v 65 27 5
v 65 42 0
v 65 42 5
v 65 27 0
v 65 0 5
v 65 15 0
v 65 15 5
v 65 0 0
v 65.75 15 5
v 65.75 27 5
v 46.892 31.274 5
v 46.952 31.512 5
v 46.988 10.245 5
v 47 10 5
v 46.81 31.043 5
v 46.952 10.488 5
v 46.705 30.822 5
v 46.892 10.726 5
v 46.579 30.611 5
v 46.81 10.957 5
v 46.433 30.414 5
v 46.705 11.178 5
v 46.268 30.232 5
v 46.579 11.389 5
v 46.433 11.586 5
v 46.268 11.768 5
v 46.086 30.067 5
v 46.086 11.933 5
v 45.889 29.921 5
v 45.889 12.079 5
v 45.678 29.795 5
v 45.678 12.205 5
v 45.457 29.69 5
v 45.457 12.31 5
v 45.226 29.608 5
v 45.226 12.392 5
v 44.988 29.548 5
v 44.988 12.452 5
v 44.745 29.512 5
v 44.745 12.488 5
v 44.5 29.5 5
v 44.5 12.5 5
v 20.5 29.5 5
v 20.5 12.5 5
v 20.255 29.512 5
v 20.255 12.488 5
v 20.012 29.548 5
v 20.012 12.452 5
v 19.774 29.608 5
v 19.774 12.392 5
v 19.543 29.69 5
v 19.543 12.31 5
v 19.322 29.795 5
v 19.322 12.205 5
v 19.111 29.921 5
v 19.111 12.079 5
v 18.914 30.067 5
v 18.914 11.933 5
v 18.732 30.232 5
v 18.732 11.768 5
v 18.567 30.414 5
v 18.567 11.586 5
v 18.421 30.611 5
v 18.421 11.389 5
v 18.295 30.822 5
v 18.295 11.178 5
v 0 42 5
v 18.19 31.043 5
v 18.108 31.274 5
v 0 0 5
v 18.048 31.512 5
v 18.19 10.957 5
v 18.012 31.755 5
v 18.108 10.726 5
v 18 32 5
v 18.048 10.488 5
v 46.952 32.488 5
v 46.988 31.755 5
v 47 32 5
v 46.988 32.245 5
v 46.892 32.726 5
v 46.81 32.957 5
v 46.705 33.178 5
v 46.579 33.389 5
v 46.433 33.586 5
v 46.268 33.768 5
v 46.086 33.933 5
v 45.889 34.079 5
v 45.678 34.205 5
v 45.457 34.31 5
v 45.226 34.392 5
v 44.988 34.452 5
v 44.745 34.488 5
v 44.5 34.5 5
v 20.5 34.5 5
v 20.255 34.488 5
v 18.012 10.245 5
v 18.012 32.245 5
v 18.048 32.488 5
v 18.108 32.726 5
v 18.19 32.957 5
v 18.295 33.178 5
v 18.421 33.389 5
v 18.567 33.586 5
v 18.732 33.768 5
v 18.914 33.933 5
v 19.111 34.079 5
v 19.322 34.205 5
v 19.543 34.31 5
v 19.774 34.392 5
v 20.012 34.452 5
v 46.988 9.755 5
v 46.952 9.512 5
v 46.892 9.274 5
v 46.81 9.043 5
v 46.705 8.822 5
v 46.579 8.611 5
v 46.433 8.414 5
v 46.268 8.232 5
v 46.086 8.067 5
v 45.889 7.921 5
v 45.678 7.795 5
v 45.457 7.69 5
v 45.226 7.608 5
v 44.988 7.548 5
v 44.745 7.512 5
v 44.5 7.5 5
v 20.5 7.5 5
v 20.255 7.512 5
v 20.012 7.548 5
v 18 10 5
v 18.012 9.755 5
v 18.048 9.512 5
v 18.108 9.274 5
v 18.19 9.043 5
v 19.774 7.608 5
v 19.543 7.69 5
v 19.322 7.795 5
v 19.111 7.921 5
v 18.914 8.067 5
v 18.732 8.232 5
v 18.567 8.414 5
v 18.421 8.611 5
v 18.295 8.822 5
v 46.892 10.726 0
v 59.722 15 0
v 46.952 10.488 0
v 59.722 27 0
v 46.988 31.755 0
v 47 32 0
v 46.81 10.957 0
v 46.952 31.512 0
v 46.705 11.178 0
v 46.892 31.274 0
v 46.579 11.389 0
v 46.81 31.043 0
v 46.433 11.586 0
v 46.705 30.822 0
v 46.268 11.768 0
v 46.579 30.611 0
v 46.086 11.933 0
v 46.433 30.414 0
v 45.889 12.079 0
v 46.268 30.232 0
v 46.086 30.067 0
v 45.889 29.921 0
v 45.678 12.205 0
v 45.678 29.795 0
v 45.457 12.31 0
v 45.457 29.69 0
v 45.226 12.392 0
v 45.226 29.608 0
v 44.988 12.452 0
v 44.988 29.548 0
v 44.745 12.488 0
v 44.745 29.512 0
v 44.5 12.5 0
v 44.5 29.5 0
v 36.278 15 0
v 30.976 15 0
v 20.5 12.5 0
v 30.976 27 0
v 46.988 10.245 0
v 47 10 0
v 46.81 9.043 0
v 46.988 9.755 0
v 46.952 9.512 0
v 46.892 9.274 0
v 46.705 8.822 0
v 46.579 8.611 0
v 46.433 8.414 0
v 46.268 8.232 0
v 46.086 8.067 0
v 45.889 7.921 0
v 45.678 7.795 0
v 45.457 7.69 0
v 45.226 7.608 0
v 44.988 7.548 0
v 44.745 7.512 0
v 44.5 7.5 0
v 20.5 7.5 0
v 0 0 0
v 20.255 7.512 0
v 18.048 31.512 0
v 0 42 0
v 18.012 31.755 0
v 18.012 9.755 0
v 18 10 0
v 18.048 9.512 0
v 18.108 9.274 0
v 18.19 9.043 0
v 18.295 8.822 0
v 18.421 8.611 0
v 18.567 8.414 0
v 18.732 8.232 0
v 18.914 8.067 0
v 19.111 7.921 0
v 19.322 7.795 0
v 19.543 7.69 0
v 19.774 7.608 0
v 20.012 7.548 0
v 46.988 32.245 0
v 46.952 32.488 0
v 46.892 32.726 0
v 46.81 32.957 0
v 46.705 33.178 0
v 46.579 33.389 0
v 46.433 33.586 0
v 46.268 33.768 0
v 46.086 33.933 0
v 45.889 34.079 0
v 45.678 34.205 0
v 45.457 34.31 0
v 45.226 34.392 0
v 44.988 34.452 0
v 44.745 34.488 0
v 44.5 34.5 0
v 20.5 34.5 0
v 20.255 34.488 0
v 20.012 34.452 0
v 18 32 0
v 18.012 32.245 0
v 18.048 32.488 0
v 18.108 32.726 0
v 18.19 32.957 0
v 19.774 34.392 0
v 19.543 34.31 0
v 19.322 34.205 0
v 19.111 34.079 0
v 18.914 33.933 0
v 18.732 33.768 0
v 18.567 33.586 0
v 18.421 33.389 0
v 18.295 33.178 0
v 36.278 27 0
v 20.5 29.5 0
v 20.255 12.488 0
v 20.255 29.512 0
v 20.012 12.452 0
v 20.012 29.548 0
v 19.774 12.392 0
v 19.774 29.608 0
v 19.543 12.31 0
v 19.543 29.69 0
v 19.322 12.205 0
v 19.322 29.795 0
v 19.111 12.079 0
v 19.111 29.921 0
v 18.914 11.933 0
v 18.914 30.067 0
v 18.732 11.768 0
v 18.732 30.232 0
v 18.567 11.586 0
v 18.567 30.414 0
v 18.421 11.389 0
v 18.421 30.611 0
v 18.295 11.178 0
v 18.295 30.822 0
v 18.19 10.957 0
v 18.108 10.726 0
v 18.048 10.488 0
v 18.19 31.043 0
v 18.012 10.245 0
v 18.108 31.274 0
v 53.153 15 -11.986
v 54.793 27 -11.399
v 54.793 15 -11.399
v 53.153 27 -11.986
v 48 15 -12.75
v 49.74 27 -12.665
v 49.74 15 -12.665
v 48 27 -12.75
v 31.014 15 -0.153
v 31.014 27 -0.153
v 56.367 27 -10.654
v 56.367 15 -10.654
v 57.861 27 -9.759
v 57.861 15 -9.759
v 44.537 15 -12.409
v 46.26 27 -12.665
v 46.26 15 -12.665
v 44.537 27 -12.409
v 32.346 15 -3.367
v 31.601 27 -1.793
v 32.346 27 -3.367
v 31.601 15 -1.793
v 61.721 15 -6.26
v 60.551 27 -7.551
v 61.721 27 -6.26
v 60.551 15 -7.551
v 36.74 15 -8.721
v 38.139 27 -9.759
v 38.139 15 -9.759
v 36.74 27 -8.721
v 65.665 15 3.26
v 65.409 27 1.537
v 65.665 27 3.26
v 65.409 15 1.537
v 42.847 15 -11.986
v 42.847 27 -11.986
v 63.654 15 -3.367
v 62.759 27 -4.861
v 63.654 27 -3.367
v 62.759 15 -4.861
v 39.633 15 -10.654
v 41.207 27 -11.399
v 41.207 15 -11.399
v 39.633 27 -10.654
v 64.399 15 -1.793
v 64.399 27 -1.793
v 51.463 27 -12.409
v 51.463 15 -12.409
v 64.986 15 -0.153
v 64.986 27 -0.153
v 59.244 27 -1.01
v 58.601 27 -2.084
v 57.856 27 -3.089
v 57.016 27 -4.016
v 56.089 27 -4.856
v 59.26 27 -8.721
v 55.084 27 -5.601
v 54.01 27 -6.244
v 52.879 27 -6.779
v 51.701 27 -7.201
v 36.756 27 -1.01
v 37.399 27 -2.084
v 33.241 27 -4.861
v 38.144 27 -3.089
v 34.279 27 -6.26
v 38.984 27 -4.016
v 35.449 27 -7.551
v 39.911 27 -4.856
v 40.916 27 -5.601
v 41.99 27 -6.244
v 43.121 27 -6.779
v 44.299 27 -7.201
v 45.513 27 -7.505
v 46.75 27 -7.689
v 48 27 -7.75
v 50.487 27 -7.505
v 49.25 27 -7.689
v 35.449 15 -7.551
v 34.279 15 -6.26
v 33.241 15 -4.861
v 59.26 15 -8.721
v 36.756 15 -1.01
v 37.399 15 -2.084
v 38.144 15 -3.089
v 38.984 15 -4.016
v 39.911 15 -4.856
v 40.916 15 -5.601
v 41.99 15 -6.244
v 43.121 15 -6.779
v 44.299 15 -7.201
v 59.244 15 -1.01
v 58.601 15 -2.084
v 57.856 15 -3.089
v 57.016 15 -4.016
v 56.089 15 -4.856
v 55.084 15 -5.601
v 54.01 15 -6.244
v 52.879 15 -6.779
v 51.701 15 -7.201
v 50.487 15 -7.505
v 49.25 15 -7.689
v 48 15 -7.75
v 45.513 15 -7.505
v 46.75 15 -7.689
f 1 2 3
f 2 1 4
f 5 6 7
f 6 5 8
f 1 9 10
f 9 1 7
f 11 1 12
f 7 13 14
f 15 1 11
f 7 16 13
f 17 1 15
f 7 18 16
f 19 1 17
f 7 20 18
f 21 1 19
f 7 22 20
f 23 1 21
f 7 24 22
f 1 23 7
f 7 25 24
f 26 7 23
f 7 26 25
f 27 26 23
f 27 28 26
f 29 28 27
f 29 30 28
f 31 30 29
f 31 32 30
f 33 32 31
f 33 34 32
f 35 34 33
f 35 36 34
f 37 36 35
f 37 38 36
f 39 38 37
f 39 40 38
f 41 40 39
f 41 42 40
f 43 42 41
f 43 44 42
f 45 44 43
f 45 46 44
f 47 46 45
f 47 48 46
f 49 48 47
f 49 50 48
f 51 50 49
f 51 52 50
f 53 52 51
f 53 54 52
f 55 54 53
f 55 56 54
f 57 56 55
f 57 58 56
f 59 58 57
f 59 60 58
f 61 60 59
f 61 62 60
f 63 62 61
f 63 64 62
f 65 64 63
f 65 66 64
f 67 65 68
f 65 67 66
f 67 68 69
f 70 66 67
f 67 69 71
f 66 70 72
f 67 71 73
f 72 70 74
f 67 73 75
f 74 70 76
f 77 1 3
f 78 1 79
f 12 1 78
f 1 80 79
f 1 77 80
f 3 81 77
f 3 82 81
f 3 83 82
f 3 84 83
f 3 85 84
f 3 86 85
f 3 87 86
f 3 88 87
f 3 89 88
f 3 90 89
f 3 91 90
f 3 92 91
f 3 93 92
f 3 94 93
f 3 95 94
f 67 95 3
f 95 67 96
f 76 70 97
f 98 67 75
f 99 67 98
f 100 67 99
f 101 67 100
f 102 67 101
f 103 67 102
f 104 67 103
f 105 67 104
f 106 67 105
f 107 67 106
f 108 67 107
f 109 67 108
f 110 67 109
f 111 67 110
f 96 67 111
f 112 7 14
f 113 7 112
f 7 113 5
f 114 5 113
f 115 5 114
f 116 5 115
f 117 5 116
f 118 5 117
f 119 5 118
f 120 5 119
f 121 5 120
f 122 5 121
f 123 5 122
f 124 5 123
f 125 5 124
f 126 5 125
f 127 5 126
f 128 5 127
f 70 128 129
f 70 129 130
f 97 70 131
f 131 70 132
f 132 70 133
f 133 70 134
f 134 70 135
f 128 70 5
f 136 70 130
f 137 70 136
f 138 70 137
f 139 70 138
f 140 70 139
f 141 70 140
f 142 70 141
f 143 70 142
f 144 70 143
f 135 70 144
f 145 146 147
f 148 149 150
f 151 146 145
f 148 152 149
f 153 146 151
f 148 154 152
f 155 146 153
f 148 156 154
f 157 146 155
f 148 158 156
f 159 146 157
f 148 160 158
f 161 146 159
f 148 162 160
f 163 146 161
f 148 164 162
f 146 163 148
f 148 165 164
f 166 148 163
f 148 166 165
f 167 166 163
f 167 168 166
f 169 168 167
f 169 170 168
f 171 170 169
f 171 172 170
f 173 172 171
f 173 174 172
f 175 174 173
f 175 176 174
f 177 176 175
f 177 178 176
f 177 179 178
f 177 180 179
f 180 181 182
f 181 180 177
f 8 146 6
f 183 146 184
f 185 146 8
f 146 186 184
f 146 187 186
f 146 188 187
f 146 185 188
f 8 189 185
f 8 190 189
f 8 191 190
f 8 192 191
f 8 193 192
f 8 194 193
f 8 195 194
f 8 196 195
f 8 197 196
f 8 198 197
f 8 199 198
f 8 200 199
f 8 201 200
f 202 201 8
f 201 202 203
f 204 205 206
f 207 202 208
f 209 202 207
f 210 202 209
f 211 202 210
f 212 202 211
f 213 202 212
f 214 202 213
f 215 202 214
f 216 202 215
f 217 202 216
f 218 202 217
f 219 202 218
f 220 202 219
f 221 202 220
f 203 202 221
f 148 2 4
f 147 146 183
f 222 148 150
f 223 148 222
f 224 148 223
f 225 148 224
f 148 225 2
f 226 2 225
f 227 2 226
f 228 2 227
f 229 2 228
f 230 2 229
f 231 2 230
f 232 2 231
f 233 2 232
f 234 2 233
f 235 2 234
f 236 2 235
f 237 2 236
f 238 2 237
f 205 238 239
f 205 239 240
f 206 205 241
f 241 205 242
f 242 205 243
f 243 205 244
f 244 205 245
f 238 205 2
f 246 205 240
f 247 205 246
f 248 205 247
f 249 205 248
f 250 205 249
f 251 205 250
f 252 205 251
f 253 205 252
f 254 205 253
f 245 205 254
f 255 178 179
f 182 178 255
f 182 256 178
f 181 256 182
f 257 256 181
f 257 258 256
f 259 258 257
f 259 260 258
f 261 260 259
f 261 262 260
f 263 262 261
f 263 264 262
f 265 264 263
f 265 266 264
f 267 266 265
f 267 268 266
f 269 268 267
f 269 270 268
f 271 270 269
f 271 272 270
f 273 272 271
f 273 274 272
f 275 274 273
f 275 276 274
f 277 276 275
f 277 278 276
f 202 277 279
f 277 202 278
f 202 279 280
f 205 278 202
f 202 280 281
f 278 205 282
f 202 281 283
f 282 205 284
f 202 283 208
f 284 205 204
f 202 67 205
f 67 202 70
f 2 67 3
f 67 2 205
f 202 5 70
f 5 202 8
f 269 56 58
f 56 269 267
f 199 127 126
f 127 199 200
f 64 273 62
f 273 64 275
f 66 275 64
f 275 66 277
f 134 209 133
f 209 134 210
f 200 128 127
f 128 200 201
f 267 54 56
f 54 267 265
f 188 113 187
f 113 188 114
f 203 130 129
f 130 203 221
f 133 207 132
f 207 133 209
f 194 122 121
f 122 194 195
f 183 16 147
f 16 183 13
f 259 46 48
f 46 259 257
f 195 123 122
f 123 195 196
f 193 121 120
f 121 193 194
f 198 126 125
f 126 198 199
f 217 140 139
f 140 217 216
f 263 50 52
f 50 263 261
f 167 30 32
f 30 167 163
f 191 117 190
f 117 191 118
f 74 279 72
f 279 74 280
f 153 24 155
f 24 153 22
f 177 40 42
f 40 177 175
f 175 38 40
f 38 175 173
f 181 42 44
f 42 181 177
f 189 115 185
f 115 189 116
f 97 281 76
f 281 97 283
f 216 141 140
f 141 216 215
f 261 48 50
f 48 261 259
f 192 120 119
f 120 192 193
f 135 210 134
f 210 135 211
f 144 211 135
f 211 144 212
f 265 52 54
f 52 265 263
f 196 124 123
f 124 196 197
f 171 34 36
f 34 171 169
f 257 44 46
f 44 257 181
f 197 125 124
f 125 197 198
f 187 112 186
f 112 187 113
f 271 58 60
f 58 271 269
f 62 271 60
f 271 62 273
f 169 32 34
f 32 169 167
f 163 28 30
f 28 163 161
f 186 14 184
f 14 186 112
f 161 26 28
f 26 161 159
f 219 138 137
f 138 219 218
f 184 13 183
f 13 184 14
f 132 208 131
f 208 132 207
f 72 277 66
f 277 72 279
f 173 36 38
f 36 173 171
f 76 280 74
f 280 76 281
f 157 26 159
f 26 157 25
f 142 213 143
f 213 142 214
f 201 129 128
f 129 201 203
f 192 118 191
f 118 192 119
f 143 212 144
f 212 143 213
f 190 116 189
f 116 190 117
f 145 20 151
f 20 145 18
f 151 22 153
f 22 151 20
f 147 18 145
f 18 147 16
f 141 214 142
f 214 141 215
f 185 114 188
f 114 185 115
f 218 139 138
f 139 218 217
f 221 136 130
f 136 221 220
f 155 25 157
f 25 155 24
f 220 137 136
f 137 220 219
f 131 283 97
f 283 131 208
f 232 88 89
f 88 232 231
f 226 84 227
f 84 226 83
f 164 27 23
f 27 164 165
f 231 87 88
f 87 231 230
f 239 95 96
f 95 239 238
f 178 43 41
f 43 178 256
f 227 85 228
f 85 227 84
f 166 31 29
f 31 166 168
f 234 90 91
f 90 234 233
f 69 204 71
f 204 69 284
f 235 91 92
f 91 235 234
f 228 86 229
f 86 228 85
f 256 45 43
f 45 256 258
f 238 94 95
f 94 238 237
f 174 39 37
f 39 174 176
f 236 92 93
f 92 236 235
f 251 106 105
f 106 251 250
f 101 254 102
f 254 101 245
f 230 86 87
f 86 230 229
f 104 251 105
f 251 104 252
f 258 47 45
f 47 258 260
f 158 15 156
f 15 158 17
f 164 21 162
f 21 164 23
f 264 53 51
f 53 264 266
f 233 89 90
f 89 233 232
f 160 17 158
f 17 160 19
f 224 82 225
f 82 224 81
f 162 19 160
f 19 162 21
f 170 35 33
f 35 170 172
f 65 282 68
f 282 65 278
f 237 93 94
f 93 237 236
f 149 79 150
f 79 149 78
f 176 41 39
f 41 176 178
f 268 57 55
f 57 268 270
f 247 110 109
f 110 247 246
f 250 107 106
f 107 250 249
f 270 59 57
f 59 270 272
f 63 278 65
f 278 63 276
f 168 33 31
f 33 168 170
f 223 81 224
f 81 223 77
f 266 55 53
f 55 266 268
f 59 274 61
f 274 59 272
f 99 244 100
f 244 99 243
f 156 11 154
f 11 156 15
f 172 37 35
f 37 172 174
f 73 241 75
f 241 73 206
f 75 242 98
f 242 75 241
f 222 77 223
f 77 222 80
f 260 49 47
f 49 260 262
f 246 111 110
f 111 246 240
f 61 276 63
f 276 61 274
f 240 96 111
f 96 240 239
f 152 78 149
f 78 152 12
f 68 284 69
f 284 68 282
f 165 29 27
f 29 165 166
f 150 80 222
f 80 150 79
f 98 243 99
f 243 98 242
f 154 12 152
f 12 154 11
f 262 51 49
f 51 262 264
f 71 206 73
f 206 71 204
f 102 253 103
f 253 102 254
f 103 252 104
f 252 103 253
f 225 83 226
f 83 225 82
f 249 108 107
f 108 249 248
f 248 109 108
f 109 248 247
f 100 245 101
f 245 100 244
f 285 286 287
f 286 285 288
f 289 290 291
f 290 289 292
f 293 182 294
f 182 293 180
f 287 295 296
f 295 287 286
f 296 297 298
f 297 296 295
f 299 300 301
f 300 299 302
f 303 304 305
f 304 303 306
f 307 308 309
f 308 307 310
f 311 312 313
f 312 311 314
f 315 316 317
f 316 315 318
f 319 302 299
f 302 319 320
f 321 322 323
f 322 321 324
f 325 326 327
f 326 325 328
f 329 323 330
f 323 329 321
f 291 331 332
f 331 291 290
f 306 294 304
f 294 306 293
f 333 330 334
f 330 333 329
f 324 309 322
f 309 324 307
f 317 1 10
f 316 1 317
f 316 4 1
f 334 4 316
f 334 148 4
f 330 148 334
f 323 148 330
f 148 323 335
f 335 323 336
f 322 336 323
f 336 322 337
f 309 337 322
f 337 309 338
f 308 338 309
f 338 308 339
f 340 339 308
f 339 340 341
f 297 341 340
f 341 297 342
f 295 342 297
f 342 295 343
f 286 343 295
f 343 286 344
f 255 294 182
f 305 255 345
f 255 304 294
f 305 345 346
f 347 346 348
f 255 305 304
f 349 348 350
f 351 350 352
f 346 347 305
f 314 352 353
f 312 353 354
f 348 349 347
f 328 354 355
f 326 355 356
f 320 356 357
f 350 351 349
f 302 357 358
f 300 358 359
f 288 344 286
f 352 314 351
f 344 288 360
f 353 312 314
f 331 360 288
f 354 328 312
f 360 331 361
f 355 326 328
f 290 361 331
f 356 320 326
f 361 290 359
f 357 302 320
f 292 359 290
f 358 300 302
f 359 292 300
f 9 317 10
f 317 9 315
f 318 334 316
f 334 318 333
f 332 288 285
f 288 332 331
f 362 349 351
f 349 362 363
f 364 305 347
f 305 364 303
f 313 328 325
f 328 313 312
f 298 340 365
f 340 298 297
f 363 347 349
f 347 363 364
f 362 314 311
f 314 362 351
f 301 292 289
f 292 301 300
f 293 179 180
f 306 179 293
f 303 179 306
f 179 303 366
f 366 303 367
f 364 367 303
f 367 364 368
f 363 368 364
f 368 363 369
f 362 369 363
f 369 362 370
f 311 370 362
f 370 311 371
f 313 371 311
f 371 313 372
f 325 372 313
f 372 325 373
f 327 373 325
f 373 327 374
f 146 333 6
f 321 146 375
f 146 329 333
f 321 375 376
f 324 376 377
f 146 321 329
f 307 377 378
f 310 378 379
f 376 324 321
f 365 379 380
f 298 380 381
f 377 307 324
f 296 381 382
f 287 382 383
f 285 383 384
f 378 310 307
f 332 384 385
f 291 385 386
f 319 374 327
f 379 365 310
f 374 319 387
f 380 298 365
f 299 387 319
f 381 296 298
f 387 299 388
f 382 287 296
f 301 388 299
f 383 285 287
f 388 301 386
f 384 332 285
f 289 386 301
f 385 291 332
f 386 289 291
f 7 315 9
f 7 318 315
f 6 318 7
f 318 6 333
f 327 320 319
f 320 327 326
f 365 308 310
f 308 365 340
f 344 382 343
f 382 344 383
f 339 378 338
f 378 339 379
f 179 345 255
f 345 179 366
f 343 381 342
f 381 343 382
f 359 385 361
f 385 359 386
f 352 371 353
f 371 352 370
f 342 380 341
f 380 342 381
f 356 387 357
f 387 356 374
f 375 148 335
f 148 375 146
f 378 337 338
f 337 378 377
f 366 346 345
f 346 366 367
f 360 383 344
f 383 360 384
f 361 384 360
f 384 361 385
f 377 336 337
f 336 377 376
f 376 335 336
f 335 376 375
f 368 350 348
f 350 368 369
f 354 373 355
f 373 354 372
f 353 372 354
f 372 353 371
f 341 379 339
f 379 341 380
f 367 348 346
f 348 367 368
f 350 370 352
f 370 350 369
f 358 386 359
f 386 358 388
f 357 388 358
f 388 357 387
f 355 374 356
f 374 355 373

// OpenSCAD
// P0 adjustable motor bracket, prototype only
$fn=64;
base_x=65;
base_y=42;
base_z=5;
slot_len=24;
slot_w=5;
motor_d=25.5;
clamp_t=5;

module slot(x,y){
    hull(){
        translate([x-slot_len/2,y, -1]) cylinder(d=slot_w,h=base_z+2);
        translate([x+slot_len/2,y, -1]) cylinder(d=slot_w,h=base_z+2);
    }
}

difference(){
    cube([base_x,base_y,base_z]);
    slot(base_x/2,10);
    slot(base_x/2,32);
}

translate([48,base_y/2,base_z])
rotate([90,0,0])
difference(){
    cylinder(d=motor_d+2*clamp_t,h=12,center=true);
    cylinder(d=motor_d,h=14,center=true);
    translate([-20,0,-10]) cube([40,30,20]);
}
